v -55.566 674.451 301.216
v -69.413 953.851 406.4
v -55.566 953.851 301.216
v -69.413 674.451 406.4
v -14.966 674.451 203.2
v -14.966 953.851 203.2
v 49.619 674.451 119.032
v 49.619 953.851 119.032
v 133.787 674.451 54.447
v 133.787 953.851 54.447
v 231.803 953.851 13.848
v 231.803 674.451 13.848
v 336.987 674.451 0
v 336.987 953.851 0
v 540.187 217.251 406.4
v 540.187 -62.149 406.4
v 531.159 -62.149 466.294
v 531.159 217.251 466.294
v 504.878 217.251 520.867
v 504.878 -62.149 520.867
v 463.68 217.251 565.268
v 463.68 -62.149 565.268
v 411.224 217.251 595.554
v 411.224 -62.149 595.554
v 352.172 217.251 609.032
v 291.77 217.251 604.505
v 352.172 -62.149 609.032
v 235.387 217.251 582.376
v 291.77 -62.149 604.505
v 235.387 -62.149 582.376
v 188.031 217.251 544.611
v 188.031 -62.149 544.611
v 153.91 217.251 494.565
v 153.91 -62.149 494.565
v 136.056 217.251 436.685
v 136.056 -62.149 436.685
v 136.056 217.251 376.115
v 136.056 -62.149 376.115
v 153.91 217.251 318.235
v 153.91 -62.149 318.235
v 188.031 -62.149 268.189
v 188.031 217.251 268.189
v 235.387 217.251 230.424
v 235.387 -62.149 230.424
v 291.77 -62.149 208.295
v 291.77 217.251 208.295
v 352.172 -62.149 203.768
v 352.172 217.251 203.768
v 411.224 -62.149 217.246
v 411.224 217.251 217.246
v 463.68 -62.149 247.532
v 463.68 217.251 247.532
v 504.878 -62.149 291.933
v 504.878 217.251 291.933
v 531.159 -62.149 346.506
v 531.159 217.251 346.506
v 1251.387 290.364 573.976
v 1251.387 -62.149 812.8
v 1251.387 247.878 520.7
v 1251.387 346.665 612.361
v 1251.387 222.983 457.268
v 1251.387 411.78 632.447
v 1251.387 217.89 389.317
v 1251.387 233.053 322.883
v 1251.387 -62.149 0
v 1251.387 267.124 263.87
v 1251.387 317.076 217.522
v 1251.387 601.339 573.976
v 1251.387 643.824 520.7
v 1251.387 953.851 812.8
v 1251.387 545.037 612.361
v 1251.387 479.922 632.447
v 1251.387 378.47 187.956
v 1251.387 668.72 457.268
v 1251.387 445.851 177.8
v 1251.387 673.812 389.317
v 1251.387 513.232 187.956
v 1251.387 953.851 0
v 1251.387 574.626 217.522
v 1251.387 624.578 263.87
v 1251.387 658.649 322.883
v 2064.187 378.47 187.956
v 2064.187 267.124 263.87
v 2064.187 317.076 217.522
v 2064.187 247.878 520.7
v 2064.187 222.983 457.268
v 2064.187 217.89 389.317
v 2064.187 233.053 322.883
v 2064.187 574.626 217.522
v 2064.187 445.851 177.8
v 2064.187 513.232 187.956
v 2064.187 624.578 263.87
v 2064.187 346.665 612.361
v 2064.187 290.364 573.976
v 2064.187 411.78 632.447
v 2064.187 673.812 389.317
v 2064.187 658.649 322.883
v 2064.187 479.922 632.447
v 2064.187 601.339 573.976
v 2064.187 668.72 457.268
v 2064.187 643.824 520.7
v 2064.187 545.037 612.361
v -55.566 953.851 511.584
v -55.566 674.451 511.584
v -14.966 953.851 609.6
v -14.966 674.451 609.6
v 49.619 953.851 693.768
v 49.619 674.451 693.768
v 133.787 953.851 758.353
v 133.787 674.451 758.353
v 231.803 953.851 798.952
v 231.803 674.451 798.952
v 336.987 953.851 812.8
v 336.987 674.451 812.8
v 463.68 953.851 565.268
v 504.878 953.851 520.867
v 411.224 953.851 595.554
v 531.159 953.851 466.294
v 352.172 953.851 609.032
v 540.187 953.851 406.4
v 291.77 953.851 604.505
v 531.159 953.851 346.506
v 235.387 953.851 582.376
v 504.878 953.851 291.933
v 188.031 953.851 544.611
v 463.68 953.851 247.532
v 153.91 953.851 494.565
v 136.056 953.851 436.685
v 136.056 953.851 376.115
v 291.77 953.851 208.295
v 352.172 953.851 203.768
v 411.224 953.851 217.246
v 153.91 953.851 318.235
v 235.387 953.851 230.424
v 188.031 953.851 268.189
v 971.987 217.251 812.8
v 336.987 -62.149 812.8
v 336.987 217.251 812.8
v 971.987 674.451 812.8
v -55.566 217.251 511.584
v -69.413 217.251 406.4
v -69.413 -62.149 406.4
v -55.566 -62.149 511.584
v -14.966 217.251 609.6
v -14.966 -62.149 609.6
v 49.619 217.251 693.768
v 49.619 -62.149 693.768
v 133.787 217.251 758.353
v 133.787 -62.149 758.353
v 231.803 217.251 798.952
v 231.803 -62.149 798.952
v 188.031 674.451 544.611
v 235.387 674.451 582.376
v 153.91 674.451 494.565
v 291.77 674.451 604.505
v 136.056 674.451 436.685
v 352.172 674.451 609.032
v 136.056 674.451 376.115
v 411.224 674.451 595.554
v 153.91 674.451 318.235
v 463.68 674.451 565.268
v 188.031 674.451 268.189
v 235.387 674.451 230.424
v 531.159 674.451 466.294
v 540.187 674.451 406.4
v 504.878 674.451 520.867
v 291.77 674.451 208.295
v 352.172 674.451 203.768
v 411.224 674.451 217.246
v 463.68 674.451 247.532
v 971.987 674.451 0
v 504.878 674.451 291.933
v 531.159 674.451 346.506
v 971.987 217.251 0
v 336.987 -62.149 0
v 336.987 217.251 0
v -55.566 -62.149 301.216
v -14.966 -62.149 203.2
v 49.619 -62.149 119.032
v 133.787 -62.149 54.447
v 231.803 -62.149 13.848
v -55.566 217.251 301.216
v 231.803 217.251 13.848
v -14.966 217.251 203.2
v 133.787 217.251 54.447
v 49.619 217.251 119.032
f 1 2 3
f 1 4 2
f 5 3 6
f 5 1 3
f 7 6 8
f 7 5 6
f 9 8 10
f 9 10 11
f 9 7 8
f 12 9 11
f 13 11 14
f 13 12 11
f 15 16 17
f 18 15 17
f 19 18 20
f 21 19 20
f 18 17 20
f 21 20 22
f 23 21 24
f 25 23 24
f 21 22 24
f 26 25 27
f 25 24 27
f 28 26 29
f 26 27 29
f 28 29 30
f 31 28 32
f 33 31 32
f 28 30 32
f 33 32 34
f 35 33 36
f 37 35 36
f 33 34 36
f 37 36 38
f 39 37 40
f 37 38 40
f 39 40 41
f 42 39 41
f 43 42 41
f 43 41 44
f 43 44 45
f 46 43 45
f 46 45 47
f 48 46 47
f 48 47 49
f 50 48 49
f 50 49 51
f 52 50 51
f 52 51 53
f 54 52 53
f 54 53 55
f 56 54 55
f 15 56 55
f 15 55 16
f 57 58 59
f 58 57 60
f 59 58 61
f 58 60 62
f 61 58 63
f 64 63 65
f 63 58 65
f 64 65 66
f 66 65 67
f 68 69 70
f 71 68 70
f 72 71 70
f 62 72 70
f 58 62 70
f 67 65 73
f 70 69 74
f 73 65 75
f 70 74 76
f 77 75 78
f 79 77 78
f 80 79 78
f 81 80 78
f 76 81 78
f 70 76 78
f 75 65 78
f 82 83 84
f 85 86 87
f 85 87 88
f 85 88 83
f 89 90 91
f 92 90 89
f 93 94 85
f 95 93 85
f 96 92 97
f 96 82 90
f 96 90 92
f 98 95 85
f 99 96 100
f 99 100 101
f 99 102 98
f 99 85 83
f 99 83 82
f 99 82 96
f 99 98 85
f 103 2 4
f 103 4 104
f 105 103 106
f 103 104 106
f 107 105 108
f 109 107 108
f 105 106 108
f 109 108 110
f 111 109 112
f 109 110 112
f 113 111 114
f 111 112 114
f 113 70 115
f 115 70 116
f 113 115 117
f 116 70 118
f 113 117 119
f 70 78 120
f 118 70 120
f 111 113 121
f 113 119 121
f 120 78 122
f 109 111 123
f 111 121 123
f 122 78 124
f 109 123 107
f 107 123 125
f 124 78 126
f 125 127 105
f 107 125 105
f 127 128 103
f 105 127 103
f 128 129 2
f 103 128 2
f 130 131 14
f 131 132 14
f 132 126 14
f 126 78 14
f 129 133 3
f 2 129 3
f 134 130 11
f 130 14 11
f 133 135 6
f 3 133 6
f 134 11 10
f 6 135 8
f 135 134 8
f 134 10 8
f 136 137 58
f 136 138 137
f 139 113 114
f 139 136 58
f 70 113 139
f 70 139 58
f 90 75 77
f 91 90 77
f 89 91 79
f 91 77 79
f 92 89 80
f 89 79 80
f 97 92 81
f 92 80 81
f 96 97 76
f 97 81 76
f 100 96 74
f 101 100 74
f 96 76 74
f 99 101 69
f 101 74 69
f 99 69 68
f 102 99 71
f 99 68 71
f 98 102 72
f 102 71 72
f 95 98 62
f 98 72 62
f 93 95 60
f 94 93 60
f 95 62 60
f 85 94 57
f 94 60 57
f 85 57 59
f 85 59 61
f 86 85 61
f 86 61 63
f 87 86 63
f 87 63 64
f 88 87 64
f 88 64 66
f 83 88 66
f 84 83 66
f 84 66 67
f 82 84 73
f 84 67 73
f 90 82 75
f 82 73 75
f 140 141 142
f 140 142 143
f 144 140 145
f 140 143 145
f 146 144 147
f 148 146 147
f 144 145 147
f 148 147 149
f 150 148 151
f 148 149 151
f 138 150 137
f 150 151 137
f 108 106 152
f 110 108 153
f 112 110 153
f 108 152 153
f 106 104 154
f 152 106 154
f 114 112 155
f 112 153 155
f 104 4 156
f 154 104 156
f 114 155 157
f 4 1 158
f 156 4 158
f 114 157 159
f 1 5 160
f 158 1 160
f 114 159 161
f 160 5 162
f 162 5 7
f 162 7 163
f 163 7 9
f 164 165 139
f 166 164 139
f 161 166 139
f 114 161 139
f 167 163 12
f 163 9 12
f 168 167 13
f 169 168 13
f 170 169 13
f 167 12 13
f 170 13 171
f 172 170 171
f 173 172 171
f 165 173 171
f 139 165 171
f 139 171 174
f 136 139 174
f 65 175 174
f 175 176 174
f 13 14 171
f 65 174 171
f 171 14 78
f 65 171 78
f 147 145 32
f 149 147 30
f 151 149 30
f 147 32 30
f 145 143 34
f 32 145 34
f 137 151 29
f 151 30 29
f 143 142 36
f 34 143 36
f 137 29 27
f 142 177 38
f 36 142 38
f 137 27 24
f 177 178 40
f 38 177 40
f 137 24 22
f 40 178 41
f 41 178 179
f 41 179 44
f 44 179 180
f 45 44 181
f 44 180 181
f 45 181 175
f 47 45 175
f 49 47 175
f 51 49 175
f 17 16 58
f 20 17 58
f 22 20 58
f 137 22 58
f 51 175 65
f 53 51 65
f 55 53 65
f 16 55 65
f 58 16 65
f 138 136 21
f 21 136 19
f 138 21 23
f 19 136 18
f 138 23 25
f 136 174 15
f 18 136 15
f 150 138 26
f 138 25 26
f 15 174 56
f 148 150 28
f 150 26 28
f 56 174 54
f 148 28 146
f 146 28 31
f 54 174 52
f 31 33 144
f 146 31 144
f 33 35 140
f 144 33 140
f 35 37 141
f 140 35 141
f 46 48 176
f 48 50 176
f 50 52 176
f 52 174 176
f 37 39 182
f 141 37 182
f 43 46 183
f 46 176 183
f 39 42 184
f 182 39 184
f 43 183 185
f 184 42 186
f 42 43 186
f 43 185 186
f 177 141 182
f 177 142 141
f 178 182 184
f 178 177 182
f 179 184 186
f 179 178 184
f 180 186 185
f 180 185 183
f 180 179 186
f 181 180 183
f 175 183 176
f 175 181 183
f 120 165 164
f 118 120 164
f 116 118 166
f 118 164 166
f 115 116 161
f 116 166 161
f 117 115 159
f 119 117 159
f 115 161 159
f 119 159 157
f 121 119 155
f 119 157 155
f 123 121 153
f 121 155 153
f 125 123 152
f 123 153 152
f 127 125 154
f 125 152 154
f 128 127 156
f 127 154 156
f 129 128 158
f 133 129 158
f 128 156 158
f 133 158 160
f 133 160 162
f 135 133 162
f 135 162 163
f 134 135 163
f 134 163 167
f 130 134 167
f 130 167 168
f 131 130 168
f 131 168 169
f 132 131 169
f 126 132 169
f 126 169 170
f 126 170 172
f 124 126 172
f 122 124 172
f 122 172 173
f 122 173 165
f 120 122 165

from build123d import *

# Parameters (mm, degrees)
F1_DEPTH = 812.8
F2_R     = 406.39999
F3_R     = 203.2
F4_DEPTH = 1016.001
F6_DEPTH = 812.8


# Not quite as in the source:
# - a fillet or chamfer is up to 0.001 mm smaller than in the source, because OpenCascade refuses the exact size


with BuildPart() as f1:
    # F0 (on Top) → F1 (new body)
    with BuildSketch(Plane.XY):
        Polygon((-69.4132745266, 217.2510341048), (-69.4132745266, -62.1489658952), (1251.3867254734, -62.1489658952), (1251.3867254734, 953.8510341048), (-69.4132745266, 953.8510341048), (-69.4132745266, 674.4510341048), (971.9867254734, 674.4510341048), (971.9867254734, 217.2510341048), align=None)
    extrude(amount=F1_DEPTH)

    # F2 (radius 406.4 in the source; OpenCascade refuses exactly that, so slightly less here)
    f2_edges = [f1.edges().sort_by_distance(p)[0] for p in [
        (-69.413275, 77.551034, 812.8),
        (-69.413275, 77.551034, 0),
        (-69.413275, 814.151034, 812.8),
        (-69.413275, 814.151034, 0),
    ]]
    fillet(f2_edges, radius=F2_R)

    # F3 (on face) → F4 (cut, through all)
    with BuildSketch(Plane.XZ.offset(62.1489658952)):
        with Locations((336.9867254734, 406.4)):
            Circle(F3_R)
    extrude(amount=-F4_DEPTH, mode=Mode.SUBTRACT)

    # F5 (on face) → F6 (join)
    with BuildSketch(Plane.YZ.offset(1251.3867254734)):
        with BuildLine():
            Line((445.8510341048, 177.8), (445.8510341048, 635))
            ThreePointArc((445.8510341048, 635), (217.2510341048, 406.4), (445.8510341048, 177.8))
        make_face()
        with BuildLine():
            ThreePointArc((674.4510341048, 406.4), (607.4956442841, 568.0446101792), (445.8510341048, 635))
            Line((445.8510341048, 635), (445.8510341048, 177.8))
            ThreePointArc((445.8510341048, 177.8), (607.4956442841, 244.7553898208), (674.4510341048, 406.4))
        make_face()
    extrude(amount=F6_DEPTH)


solid = f1.part
